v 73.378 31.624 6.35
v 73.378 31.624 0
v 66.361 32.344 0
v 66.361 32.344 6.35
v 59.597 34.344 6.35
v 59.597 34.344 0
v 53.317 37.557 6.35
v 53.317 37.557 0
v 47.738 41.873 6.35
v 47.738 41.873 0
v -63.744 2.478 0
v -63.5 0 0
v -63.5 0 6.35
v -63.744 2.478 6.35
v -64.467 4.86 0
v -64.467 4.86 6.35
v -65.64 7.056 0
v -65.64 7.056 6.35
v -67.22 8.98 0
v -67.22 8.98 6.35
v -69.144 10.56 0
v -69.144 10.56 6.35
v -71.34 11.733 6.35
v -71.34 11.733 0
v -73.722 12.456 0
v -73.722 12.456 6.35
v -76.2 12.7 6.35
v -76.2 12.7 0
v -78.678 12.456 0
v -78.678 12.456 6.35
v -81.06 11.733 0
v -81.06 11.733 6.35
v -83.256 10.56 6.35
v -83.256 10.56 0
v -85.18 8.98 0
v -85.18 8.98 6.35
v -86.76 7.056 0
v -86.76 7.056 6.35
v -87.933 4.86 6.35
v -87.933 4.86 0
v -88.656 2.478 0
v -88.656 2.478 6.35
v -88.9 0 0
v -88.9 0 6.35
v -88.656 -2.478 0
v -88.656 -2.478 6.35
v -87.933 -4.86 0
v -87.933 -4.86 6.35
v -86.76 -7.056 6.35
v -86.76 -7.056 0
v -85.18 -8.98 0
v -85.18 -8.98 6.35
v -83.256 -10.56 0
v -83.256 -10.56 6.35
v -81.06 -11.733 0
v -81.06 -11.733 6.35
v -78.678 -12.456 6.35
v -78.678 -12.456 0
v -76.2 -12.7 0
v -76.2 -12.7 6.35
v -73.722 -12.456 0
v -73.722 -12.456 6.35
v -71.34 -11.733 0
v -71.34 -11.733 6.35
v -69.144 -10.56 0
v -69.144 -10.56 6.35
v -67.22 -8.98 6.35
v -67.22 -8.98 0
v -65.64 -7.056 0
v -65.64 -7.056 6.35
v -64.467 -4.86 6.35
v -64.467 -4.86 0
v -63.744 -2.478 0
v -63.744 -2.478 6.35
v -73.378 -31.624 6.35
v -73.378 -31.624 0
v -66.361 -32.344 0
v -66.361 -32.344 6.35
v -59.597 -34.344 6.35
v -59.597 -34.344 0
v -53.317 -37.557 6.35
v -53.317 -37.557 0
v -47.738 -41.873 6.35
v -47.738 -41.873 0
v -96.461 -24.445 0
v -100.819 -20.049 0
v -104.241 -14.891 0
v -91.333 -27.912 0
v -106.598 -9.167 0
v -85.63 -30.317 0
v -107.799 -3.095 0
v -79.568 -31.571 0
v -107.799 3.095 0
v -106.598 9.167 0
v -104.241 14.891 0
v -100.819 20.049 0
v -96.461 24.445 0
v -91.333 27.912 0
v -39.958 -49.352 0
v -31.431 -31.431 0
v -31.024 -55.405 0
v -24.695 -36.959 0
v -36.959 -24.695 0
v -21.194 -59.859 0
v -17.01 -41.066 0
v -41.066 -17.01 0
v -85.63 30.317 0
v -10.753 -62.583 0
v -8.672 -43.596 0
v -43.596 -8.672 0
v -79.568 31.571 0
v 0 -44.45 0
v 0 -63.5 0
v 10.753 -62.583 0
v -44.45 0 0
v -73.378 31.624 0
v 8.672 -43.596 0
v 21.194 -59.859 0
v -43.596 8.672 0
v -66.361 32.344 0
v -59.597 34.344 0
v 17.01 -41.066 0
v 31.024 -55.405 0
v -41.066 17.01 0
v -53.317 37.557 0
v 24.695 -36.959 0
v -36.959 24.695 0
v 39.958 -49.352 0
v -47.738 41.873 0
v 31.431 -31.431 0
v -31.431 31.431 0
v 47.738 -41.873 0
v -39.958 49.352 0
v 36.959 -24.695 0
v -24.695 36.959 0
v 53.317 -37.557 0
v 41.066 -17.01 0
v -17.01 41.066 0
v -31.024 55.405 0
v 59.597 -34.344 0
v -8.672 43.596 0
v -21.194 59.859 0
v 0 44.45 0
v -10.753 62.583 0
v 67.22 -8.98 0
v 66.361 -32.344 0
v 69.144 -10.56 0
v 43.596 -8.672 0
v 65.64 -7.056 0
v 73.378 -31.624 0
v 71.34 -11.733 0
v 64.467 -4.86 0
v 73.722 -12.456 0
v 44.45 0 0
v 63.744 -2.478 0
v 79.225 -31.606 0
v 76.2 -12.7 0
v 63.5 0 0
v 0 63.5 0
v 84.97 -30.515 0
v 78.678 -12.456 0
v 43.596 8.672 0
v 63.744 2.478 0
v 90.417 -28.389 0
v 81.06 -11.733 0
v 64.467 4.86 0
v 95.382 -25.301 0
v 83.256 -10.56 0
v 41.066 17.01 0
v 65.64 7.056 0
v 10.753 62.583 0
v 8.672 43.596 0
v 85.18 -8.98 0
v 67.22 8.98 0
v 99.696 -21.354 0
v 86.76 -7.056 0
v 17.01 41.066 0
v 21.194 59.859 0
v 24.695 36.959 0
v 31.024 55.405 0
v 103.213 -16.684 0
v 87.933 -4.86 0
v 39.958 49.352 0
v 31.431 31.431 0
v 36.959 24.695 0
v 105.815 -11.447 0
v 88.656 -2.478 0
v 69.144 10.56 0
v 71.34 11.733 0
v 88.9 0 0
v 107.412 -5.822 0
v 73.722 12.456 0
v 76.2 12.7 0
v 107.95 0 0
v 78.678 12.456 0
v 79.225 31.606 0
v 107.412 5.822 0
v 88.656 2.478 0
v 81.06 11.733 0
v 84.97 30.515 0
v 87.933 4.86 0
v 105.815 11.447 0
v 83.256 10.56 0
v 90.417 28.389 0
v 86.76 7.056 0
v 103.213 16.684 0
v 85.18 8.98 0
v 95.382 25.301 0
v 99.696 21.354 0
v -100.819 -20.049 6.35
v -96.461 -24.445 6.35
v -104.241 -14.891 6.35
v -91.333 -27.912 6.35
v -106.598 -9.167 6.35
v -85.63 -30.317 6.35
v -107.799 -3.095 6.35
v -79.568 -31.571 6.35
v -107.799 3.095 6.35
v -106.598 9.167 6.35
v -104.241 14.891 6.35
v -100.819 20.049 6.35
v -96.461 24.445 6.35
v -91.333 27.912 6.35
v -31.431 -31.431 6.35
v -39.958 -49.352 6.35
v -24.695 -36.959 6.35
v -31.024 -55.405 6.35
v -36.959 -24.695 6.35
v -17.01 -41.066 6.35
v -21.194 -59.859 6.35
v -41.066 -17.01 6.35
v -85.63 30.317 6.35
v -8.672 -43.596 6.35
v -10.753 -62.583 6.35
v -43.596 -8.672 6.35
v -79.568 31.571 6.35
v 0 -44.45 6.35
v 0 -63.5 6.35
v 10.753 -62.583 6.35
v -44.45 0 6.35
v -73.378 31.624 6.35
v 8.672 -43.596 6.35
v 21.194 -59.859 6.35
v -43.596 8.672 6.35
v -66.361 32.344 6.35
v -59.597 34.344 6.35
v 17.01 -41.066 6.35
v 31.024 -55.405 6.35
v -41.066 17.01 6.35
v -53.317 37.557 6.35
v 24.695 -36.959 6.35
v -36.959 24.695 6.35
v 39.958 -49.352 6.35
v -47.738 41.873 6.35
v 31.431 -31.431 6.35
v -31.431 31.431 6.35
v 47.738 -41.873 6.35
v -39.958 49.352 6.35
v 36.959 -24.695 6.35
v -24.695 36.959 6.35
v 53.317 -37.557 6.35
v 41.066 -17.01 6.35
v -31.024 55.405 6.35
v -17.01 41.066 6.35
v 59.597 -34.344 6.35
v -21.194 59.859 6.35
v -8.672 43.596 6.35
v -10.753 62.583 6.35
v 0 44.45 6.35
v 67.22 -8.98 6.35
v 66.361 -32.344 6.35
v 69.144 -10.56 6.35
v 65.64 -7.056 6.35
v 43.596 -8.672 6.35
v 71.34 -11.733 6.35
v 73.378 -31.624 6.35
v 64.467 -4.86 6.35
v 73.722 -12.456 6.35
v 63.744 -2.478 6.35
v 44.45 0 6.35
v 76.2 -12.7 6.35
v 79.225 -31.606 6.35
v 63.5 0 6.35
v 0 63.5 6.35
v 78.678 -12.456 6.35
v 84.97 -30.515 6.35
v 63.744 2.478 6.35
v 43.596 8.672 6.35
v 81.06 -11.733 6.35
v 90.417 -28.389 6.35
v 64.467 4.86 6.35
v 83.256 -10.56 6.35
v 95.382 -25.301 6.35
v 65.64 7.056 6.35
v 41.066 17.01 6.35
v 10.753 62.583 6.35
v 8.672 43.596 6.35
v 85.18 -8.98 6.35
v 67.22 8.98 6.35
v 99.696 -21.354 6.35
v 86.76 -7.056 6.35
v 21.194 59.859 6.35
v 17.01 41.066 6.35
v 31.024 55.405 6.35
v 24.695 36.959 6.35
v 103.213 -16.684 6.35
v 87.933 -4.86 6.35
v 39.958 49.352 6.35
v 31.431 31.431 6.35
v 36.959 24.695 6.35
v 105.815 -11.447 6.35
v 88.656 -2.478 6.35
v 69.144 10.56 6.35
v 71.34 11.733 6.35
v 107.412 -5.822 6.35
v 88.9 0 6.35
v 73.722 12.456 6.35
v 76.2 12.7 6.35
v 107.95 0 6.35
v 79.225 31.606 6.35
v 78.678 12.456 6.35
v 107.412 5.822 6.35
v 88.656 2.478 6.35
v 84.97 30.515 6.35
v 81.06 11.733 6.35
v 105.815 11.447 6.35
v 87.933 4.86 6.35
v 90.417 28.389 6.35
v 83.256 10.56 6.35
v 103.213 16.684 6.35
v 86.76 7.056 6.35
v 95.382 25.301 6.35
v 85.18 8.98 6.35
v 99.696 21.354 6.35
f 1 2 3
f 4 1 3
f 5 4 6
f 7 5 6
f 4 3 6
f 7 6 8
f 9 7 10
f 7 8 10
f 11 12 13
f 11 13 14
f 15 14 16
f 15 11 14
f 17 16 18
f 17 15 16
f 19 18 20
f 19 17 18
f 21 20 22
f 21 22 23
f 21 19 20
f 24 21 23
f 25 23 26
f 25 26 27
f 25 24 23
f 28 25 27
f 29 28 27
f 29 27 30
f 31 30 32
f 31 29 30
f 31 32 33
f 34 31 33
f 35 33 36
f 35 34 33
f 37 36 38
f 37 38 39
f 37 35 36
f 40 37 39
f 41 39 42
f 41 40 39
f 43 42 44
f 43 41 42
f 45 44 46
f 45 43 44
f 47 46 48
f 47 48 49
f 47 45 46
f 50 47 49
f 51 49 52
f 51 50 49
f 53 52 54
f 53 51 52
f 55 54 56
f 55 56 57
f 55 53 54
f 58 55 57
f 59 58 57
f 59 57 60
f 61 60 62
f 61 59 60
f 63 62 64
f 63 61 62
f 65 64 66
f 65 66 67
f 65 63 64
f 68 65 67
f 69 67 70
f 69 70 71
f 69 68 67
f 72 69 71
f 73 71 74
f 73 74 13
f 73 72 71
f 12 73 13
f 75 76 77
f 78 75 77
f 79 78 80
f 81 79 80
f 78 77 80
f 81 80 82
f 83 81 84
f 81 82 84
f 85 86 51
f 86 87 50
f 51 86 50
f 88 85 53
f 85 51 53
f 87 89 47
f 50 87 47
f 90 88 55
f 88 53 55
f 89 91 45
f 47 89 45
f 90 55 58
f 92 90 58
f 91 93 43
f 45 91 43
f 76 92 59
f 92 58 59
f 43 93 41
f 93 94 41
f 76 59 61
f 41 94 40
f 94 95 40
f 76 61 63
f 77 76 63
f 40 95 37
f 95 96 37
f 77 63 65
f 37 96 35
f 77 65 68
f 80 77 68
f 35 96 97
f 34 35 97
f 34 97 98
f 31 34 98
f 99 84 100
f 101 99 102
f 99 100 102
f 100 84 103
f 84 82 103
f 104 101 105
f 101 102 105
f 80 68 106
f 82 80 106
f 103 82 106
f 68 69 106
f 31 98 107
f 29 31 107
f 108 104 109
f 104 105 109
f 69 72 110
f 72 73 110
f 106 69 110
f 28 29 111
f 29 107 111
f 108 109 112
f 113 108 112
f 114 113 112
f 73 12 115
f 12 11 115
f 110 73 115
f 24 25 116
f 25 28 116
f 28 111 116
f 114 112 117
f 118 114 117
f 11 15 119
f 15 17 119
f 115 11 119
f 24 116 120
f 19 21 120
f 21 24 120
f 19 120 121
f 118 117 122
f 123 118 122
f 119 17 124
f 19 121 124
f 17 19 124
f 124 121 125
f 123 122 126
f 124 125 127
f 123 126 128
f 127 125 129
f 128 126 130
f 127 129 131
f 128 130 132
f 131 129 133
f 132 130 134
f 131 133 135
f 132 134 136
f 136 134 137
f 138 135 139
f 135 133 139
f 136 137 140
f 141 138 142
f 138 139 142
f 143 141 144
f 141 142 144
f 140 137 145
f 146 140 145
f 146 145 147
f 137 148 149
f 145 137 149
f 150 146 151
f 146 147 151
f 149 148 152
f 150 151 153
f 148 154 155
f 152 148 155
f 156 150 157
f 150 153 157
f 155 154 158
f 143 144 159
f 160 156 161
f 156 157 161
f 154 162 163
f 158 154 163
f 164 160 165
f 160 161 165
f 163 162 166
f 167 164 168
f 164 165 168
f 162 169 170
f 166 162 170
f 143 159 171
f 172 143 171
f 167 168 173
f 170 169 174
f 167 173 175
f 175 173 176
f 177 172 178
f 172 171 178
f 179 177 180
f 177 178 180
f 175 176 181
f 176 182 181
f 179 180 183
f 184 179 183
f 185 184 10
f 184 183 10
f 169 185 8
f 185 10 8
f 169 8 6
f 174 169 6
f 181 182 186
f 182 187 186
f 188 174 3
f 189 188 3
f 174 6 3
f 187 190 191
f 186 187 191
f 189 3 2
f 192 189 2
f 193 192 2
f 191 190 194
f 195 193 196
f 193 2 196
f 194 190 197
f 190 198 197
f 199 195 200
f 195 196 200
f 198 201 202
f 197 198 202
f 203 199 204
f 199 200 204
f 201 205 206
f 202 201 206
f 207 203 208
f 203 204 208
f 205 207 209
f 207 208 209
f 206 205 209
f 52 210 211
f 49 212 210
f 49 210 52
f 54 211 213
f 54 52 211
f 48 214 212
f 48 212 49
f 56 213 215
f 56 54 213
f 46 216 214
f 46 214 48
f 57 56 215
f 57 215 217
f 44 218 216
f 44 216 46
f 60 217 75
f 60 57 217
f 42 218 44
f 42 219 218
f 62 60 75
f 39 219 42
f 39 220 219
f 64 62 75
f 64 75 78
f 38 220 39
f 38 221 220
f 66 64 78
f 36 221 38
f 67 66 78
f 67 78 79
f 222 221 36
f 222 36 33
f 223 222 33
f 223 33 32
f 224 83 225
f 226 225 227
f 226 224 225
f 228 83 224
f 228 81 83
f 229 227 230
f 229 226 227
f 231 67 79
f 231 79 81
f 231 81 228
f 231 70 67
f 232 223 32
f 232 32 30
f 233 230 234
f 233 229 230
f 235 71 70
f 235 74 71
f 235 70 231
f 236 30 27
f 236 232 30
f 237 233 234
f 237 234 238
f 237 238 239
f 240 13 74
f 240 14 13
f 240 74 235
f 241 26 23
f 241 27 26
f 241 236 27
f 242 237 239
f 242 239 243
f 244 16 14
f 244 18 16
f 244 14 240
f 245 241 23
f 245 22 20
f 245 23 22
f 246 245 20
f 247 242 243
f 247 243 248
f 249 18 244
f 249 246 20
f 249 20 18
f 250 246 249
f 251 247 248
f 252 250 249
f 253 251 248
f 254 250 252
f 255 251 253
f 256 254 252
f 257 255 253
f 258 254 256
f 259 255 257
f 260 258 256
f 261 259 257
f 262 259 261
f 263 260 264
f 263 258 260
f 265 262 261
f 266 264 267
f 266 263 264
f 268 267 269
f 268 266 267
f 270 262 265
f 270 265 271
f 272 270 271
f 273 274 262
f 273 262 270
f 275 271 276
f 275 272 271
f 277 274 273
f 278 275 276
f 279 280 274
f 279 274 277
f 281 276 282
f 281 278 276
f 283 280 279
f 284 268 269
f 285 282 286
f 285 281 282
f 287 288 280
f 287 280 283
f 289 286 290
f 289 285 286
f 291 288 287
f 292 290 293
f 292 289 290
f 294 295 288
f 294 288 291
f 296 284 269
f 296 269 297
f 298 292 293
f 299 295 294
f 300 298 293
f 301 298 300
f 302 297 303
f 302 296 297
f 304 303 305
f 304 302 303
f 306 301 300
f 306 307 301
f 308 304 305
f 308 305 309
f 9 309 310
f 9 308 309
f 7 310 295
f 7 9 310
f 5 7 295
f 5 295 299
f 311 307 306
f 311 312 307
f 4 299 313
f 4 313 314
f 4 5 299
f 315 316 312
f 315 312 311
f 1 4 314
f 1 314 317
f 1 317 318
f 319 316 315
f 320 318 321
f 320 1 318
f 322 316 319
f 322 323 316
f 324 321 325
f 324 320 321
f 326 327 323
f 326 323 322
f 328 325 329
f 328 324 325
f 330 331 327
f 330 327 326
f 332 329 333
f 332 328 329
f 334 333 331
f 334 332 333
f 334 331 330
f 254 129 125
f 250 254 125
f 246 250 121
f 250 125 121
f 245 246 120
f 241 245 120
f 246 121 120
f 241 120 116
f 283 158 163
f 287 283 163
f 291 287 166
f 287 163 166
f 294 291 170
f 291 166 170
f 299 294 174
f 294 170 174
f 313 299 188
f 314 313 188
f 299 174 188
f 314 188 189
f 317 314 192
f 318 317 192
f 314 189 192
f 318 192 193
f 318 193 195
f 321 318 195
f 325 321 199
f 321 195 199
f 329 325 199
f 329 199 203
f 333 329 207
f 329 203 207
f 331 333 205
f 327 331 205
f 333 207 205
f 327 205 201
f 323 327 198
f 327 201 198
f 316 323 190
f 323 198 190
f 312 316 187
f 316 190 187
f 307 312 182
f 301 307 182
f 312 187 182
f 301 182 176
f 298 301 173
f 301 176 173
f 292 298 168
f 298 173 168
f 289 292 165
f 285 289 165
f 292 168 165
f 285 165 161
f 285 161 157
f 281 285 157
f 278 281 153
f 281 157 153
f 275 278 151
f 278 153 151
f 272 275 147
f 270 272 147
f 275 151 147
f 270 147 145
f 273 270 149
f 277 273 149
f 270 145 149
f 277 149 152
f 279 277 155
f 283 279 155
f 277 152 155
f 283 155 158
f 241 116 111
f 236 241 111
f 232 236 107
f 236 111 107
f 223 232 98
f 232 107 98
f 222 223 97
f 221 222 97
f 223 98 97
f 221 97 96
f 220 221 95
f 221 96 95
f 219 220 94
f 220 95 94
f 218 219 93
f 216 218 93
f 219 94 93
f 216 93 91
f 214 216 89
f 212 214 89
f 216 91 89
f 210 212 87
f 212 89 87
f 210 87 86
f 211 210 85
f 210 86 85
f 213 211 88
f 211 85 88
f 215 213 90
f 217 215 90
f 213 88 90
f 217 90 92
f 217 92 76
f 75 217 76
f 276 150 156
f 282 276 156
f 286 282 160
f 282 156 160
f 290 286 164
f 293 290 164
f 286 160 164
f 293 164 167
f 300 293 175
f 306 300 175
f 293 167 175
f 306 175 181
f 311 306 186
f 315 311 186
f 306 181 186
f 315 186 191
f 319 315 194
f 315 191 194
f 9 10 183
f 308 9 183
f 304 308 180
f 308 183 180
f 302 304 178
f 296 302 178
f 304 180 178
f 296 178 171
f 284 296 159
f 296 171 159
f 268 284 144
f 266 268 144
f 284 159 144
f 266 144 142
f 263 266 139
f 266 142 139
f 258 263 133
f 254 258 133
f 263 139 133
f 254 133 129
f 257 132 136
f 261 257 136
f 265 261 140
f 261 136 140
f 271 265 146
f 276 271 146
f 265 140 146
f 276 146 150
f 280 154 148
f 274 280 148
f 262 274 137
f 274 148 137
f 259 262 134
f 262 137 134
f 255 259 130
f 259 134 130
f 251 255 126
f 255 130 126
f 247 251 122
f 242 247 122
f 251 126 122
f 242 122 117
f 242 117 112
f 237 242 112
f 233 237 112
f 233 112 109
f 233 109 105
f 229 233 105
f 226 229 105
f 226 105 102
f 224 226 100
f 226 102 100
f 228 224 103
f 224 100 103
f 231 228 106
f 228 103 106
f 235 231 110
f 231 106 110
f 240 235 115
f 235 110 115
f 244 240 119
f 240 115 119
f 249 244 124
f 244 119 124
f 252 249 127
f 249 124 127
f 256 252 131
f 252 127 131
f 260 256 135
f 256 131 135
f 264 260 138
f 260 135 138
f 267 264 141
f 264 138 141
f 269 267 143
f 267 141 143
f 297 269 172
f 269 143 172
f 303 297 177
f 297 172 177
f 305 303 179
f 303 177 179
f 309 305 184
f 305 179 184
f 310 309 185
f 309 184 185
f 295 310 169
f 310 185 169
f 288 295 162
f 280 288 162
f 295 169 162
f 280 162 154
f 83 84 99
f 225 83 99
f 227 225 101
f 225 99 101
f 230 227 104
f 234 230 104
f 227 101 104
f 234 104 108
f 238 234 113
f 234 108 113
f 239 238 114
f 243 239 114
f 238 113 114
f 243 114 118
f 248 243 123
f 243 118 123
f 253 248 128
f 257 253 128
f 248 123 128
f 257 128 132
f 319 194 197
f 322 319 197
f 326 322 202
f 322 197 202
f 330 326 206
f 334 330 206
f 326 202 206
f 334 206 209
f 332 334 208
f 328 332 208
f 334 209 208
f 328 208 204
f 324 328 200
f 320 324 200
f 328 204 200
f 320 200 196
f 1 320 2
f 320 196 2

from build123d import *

# Parameters (mm, degrees)
F0_R     = 12.7
F1_DEPTH = 6.35


with BuildPart() as f1:
    # F0 (on Top) → F1 (new body)
    with BuildSketch(Plane.XY):
        with BuildLine():
            ThreePointArc((-63.5, 0), (-62.0954029096, 13.2819779212), (-57.94375, 25.976370723))
            ThreePointArc((-57.94375, 25.976370723), (-65.2892675199, 29.8164118691), (-73.3783848407, 31.6243733202))
            ThreePointArc((-73.3783848407, 31.6243733202), (-107.95, 0), (-73.3783848407, -31.6243733202))
            ThreePointArc((-73.3783848407, -31.6243733202), (-65.2892675199, -29.8164118691), (-57.94375, -25.976370723))
            ThreePointArc((-57.94375, -25.976370723), (-62.0954029096, -13.2819779212), (-63.5, 0))
        make_face()
        with Locations((-76.2, 0)):
            Circle(F0_R, mode=Mode.SUBTRACT)
        with BuildLine():
            ThreePointArc((-57.94375, -25.976370723), (-48.024670033, -14.636026826), (-44.45, 0))
            ThreePointArc((-44.45, 0), (-48.024670033, 14.636026826), (-57.94375, 25.976370723))
            ThreePointArc((-57.94375, 25.976370723), (-62.0954029096, 13.2819779212), (-63.5, 0))
            ThreePointArc((-63.5, 0), (-62.0954029096, -13.2819779212), (-57.94375, -25.976370723))
        make_face()
        with BuildLine():
            ThreePointArc((57.94375, -25.976370723), (48.024670033, -14.636026826), (44.45, 0))
            ThreePointArc((44.45, 0), (0, -44.45), (-44.45, 0))
            ThreePointArc((-44.45, 0), (-48.024670033, -14.636026826), (-57.94375, -25.976370723))
            ThreePointArc((-57.94375, -25.976370723), (-53.4352444367, -34.3063354497), (-47.7378395074, -41.8730065694))
            ThreePointArc((-47.7378395074, -41.8730065694), (0, -63.5), (47.7378395074, -41.8730065694))
            ThreePointArc((47.7378395074, -41.8730065694), (53.4352444367, -34.3063354497), (57.94375, -25.976370723))
        make_face()
        with BuildLine():
            ThreePointArc((-47.7378395074, -41.8730065694), (-53.4352444367, -34.3063354497), (-57.94375, -25.976370723))
            ThreePointArc((-57.94375, -25.976370723), (-65.2892675199, -29.8164118691), (-73.3783848407, -31.6243733202))
            ThreePointArc((-73.3783848407, -31.6243733202), (-59.5969903083, -34.344106995), (-47.7378395074, -41.8730065694))
        make_face()
        with BuildLine():
            ThreePointArc((-73.3783848407, 31.6243733202), (-65.2892675199, 29.8164118691), (-57.94375, 25.976370723))
            ThreePointArc((-57.94375, 25.976370723), (-53.4352444367, 34.3063354497), (-47.7378395074, 41.8730065694))
            ThreePointArc((-47.7378395074, 41.8730065694), (-59.5969903083, 34.344106995), (-73.3783848407, 31.6243733202))
        make_face()
        with BuildLine():
            ThreePointArc((-44.45, 0), (0, 44.45), (44.45, 0))
            ThreePointArc((44.45, 0), (48.024670033, 14.636026826), (57.94375, 25.976370723))
            ThreePointArc((57.94375, 25.976370723), (53.4352444367, 34.3063354497), (47.7378395074, 41.8730065694))
            ThreePointArc((47.7378395074, 41.8730065694), (0, 63.5), (-47.7378395074, 41.8730065694))
            ThreePointArc((-47.7378395074, 41.8730065694), (-53.4352444367, 34.3063354497), (-57.94375, 25.976370723))
            ThreePointArc((-57.94375, 25.976370723), (-48.024670033, 14.636026826), (-44.45, 0))
        make_face()
        with BuildLine():
            ThreePointArc((73.3783848407, 31.6243733202), (65.2892675199, 29.8164118691), (57.94375, 25.976370723))
            ThreePointArc((57.94375, 25.976370723), (62.0954029096, 13.2819779212), (63.5, 0))
            ThreePointArc((63.5, 0), (62.0954029096, -13.2819779212), (57.94375, -25.976370723))
            ThreePointArc((57.94375, -25.976370723), (65.2892675199, -29.8164118691), (73.3783848407, -31.6243733202))
            ThreePointArc((73.3783848407, -31.6243733202), (97.6298415614, -23.4270013159), (107.95, 0))
            ThreePointArc((107.95, 0), (97.6298415614, 23.4270013159), (73.3783848407, 31.6243733202))
        make_face()
        with BuildLine():
            ThreePointArc((88.9, 0), (76.2, -12.7), (63.5, 0))
            ThreePointArc((63.5, 0), (76.2, 12.7), (88.9, 0))
        make_face(mode=Mode.SUBTRACT)
        with BuildLine():
            ThreePointArc((57.94375, 25.976370723), (48.024670033, 14.636026826), (44.45, 0))
            ThreePointArc((44.45, 0), (48.024670033, -14.636026826), (57.94375, -25.976370723))
            ThreePointArc((57.94375, -25.976370723), (62.0954029096, -13.2819779212), (63.5, 0))
            ThreePointArc((63.5, 0), (62.0954029096, 13.2819779212), (57.94375, 25.976370723))
        make_face()
        with BuildLine():
            ThreePointArc((47.7378395074, 41.8730065694), (53.4352444367, 34.3063354497), (57.94375, 25.976370723))
            ThreePointArc((57.94375, 25.976370723), (65.2892675199, 29.8164118691), (73.3783848407, 31.6243733202))
            ThreePointArc((73.3783848407, 31.6243733202), (59.5969903083, 34.344106995), (47.7378395074, 41.8730065694))
        make_face()
        with BuildLine():
            ThreePointArc((73.3783848407, -31.6243733202), (65.2892675199, -29.8164118691), (57.94375, -25.976370723))
            ThreePointArc((57.94375, -25.976370723), (53.4352444367, -34.3063354497), (47.7378395074, -41.8730065694))
            ThreePointArc((47.7378395074, -41.8730065694), (59.5969903083, -34.344106995), (73.3783848407, -31.6243733202))
        make_face()
    extrude(amount=F1_DEPTH)


solid = f1.part
